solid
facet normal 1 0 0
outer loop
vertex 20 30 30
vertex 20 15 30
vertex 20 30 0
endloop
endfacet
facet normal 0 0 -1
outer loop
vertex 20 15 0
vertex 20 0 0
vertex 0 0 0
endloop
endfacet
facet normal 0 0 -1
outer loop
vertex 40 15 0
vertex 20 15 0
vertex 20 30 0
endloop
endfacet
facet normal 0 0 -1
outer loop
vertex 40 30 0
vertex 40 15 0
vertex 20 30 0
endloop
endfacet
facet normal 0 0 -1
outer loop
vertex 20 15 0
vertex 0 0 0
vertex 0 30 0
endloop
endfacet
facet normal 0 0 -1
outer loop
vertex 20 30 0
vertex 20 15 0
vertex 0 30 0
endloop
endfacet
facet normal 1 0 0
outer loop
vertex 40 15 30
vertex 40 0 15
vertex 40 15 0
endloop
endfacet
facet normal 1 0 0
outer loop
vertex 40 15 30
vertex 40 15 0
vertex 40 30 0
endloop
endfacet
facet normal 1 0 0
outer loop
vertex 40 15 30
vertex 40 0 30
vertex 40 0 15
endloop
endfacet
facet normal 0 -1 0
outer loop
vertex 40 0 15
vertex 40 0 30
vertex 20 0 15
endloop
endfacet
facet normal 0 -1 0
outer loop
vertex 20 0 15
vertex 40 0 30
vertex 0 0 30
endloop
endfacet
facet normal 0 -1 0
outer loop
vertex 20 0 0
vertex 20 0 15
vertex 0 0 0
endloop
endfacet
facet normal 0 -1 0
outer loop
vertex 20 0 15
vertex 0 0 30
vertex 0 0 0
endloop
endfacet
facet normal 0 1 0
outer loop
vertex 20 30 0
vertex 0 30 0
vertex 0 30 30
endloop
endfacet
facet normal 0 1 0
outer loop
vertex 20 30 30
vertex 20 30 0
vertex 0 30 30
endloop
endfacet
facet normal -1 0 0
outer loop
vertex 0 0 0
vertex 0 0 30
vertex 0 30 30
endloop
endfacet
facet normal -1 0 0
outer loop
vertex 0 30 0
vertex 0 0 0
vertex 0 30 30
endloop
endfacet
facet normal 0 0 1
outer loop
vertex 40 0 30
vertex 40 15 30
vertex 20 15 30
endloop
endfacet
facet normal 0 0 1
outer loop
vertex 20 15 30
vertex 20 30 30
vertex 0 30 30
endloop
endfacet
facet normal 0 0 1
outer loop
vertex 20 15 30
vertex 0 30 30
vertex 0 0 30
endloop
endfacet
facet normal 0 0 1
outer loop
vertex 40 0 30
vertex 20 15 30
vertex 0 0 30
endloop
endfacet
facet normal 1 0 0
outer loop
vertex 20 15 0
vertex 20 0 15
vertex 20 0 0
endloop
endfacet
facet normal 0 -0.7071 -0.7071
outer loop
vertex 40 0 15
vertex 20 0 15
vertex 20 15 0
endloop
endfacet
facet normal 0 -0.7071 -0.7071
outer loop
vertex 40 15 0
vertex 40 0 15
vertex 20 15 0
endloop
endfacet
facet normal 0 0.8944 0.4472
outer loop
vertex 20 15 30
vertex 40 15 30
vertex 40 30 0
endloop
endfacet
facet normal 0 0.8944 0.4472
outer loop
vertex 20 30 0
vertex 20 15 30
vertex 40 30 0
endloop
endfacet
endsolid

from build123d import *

# Parameters (mm, degrees)
F0_W     = 15
F0_H     = 15
F1_DEPTH = 20
F2_DEPTH = 40
F4_DEPTH = 20
F6_DEPTH = 20


with BuildPart() as f1:
    # F0 (on Right) → F1 (new body)
    with BuildSketch(Plane.YZ):
        with Locations((7.5, 7.5)):
            Rectangle(F0_W, F0_H)
        with Locations((22.5, 7.5)):
            Rectangle(F0_W, F0_H)
        with Locations((7.5, 22.5)):
            Rectangle(F0_W, F0_H)
        with Locations((22.5, 22.5)):
            Rectangle(F0_W, F0_H)
    extrude(amount=F1_DEPTH)

    # F0 (on Right) → F2 (join)
    with BuildSketch(Plane.YZ):
        with Locations((22.5, 7.5)):
            Rectangle(F0_W, F0_H)
        with Locations((22.5, 22.5)):
            Rectangle(F0_W, F0_H)
        with Locations((7.5, 22.5)):
            Rectangle(F0_W, F0_H)
    extrude(amount=F2_DEPTH)

    # F3 (on face) → F4 (cut)
    with BuildSketch(Plane.YZ.offset(40)):
        Polygon((30, 30), (15, 30), (30, 0), align=None)
    extrude(amount=-F4_DEPTH, mode=Mode.SUBTRACT)

    # F5 (on face) → F6 (join)
    with BuildSketch(Plane.YZ.offset(20)):
        Polygon((15, 15), (0, 15), (15, 0), align=None)
    extrude(amount=F6_DEPTH)


solid = f1.part
